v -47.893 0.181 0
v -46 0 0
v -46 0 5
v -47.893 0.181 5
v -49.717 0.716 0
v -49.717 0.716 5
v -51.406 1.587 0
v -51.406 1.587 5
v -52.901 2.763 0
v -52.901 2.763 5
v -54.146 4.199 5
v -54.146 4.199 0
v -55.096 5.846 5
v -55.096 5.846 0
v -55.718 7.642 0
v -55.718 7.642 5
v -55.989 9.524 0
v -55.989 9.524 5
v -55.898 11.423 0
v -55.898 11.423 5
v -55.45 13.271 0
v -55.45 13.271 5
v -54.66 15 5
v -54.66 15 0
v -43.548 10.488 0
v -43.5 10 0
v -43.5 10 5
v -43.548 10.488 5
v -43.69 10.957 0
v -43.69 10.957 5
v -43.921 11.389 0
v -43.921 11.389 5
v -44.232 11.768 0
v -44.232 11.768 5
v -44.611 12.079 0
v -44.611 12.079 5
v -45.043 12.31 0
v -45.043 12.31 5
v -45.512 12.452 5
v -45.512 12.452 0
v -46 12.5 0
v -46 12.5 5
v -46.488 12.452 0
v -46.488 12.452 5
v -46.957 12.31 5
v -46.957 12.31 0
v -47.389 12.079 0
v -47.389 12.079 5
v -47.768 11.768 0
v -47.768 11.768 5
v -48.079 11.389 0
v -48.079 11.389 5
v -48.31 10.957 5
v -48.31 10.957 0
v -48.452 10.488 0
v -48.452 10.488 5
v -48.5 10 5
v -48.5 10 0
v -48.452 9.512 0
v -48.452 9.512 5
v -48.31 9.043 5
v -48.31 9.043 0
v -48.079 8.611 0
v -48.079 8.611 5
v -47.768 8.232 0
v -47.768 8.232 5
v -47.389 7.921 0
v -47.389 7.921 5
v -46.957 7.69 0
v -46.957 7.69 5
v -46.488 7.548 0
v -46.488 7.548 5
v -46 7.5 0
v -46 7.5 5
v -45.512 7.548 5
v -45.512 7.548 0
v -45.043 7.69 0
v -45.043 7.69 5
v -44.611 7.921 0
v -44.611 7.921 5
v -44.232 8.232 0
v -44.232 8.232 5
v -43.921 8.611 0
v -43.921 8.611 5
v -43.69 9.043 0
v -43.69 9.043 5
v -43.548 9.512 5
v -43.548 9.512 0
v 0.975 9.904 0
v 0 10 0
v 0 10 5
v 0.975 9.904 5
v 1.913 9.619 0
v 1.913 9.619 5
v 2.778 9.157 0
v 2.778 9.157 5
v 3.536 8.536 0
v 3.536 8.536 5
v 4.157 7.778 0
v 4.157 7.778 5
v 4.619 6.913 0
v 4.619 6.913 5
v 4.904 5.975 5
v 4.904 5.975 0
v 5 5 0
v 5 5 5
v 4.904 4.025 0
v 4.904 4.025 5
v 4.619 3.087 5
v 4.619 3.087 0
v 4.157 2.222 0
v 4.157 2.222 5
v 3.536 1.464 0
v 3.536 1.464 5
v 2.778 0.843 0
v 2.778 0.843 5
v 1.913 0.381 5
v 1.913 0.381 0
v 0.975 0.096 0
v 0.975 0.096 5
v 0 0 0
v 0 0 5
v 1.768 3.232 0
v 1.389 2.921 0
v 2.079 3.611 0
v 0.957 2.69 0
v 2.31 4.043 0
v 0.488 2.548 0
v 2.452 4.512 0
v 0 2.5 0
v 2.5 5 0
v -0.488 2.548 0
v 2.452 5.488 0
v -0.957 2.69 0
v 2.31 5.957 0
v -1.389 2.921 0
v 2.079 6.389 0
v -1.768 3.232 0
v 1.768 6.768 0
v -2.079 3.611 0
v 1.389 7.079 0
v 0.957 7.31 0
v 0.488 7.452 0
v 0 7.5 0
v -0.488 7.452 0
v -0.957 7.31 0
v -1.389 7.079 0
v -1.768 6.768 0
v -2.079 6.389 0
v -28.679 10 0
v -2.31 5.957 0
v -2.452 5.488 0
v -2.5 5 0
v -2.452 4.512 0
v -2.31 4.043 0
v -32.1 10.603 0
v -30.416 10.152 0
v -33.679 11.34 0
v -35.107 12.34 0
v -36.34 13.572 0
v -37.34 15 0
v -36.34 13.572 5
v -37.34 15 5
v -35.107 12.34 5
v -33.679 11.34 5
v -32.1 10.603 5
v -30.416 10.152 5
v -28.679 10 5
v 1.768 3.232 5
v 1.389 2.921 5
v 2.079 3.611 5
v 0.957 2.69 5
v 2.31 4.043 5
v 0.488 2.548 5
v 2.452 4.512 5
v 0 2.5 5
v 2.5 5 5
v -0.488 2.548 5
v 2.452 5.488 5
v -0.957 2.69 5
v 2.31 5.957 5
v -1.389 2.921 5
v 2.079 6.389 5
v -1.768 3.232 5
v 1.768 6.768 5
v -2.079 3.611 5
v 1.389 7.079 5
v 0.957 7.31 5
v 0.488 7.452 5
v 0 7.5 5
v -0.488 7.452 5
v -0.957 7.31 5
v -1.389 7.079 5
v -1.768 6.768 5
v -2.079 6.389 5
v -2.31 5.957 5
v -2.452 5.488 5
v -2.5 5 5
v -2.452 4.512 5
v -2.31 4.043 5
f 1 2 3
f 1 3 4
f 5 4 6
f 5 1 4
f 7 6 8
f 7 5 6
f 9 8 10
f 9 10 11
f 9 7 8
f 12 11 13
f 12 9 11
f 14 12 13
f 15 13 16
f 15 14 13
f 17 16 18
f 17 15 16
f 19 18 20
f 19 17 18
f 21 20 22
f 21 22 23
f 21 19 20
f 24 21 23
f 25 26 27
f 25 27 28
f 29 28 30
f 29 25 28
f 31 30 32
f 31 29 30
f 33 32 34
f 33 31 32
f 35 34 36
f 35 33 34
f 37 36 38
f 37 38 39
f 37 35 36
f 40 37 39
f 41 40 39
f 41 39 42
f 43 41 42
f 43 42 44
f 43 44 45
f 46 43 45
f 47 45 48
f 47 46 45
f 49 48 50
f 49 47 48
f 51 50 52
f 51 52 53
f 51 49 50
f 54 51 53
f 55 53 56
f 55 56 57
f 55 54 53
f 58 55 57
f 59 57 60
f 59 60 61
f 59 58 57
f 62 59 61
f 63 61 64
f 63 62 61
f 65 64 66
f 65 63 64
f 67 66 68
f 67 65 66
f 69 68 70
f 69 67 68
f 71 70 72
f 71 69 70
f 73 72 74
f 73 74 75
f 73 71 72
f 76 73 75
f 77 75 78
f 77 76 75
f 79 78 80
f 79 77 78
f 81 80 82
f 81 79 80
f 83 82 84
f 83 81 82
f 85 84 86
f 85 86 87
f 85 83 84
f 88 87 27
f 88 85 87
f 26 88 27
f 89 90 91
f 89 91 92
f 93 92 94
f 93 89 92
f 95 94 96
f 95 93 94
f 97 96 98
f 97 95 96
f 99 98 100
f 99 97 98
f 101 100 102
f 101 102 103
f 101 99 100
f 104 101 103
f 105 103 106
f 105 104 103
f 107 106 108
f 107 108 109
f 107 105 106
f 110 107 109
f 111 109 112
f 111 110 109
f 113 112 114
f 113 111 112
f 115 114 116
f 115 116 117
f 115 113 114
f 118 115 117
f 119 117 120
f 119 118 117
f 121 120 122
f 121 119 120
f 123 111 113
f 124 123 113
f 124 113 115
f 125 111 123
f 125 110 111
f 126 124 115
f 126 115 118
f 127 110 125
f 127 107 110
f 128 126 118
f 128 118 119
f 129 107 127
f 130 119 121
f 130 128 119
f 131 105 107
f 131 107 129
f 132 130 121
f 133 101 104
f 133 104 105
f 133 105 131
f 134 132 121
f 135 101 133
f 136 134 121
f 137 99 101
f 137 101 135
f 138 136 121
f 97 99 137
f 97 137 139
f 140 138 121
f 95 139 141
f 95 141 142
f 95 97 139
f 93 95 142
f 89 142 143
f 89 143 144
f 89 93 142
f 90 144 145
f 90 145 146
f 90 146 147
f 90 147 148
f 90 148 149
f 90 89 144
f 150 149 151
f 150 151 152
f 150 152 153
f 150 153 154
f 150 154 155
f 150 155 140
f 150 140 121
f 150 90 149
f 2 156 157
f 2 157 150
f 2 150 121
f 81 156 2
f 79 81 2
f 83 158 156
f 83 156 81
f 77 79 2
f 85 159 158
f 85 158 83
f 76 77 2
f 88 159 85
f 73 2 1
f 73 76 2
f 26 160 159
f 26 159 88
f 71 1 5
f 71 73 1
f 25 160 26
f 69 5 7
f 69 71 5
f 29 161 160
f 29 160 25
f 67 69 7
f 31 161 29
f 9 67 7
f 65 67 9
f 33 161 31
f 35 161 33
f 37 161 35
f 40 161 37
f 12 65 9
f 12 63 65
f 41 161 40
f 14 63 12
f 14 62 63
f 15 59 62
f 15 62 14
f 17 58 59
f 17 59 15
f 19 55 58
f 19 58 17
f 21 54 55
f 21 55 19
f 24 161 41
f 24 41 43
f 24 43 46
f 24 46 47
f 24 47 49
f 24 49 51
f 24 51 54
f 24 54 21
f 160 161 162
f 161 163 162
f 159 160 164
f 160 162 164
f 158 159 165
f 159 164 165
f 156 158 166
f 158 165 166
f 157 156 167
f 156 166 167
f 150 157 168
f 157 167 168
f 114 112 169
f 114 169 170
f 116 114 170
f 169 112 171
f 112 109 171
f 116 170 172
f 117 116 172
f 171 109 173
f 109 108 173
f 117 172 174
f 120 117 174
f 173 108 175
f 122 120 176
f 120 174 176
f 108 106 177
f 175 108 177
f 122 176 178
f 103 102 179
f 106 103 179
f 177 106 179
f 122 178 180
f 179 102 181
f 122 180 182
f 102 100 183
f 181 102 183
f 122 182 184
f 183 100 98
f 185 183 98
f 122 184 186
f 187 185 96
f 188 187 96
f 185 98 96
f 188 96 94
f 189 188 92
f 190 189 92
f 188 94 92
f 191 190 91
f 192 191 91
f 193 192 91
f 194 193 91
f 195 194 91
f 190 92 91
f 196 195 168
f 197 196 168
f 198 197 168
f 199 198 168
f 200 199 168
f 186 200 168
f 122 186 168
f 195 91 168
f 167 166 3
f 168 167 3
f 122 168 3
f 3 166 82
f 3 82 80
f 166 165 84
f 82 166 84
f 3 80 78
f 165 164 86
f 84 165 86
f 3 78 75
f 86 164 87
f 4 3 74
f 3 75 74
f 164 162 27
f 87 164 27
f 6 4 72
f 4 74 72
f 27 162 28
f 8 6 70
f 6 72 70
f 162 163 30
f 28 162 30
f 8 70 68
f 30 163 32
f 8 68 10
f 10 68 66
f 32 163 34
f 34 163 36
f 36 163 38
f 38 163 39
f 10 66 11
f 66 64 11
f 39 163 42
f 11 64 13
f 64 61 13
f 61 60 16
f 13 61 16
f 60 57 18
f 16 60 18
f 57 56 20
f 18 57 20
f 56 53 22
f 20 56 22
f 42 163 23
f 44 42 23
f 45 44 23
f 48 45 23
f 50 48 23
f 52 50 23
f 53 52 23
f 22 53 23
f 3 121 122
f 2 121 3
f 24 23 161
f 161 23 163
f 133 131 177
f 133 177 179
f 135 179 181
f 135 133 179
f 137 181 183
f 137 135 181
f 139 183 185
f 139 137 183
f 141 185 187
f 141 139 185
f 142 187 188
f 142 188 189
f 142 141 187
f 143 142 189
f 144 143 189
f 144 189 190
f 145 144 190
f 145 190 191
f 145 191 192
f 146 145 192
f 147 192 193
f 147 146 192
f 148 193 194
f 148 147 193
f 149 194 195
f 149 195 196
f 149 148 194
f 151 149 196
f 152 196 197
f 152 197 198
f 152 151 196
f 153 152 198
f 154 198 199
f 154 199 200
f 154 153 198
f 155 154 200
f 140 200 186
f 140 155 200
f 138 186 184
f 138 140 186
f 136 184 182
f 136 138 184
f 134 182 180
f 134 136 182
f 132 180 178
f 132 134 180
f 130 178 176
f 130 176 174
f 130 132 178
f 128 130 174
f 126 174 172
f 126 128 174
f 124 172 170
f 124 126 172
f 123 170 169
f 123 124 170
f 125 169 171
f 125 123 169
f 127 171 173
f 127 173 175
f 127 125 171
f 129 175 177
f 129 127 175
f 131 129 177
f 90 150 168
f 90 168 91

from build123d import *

# Parameters (mm, degrees)
ESQUISSE1_R             = 2.5
BOSS_EXTRU_1_DEPTH      = 5
CONG_1_R                = 10
ESQUISSE2_W             = 18.660254038
ESQUISSE2_H             = 5
ENL_V_MAT_EXTRU_1_DEPTH = 5


with BuildPart() as part:
    # Esquisse1 → Boss.-Extru.1 (new body)
    with BuildSketch(Plane.XY):
        with BuildLine():
            Line((0, 0), (-46, 0))
            ThreePointArc((-46, 0), (-53.071067812, 17.071067812), (-36, 10))
            Line((-36, 10), (0, 10))
            ThreePointArc((0, 10), (5, 5), (0, 0))
        make_face()
        with Locations((-46, 10)):
            Circle(ESQUISSE1_R, mode=Mode.SUBTRACT)
        with Locations((0, 5)):
            Circle(ESQUISSE1_R, mode=Mode.SUBTRACT)
    extrude(amount=BOSS_EXTRU_1_DEPTH)

    # Congé1
    cong_1_edges = [part.edges().sort_by_distance(p)[0] for p in [
        (-36, 10, 2.5),
    ]]
    fillet(cong_1_edges, radius=CONG_1_R)

    # Esquisse2 → Enlèv. mat.-Extru.1 (cut)
    with BuildSketch(Plane.XY.offset(5)):
        with Locations((-46.669872981, 17.5)):
            Rectangle(ESQUISSE2_W, ESQUISSE2_H)
    extrude(amount=-ENL_V_MAT_EXTRU_1_DEPTH, mode=Mode.SUBTRACT)


solid = part.part
